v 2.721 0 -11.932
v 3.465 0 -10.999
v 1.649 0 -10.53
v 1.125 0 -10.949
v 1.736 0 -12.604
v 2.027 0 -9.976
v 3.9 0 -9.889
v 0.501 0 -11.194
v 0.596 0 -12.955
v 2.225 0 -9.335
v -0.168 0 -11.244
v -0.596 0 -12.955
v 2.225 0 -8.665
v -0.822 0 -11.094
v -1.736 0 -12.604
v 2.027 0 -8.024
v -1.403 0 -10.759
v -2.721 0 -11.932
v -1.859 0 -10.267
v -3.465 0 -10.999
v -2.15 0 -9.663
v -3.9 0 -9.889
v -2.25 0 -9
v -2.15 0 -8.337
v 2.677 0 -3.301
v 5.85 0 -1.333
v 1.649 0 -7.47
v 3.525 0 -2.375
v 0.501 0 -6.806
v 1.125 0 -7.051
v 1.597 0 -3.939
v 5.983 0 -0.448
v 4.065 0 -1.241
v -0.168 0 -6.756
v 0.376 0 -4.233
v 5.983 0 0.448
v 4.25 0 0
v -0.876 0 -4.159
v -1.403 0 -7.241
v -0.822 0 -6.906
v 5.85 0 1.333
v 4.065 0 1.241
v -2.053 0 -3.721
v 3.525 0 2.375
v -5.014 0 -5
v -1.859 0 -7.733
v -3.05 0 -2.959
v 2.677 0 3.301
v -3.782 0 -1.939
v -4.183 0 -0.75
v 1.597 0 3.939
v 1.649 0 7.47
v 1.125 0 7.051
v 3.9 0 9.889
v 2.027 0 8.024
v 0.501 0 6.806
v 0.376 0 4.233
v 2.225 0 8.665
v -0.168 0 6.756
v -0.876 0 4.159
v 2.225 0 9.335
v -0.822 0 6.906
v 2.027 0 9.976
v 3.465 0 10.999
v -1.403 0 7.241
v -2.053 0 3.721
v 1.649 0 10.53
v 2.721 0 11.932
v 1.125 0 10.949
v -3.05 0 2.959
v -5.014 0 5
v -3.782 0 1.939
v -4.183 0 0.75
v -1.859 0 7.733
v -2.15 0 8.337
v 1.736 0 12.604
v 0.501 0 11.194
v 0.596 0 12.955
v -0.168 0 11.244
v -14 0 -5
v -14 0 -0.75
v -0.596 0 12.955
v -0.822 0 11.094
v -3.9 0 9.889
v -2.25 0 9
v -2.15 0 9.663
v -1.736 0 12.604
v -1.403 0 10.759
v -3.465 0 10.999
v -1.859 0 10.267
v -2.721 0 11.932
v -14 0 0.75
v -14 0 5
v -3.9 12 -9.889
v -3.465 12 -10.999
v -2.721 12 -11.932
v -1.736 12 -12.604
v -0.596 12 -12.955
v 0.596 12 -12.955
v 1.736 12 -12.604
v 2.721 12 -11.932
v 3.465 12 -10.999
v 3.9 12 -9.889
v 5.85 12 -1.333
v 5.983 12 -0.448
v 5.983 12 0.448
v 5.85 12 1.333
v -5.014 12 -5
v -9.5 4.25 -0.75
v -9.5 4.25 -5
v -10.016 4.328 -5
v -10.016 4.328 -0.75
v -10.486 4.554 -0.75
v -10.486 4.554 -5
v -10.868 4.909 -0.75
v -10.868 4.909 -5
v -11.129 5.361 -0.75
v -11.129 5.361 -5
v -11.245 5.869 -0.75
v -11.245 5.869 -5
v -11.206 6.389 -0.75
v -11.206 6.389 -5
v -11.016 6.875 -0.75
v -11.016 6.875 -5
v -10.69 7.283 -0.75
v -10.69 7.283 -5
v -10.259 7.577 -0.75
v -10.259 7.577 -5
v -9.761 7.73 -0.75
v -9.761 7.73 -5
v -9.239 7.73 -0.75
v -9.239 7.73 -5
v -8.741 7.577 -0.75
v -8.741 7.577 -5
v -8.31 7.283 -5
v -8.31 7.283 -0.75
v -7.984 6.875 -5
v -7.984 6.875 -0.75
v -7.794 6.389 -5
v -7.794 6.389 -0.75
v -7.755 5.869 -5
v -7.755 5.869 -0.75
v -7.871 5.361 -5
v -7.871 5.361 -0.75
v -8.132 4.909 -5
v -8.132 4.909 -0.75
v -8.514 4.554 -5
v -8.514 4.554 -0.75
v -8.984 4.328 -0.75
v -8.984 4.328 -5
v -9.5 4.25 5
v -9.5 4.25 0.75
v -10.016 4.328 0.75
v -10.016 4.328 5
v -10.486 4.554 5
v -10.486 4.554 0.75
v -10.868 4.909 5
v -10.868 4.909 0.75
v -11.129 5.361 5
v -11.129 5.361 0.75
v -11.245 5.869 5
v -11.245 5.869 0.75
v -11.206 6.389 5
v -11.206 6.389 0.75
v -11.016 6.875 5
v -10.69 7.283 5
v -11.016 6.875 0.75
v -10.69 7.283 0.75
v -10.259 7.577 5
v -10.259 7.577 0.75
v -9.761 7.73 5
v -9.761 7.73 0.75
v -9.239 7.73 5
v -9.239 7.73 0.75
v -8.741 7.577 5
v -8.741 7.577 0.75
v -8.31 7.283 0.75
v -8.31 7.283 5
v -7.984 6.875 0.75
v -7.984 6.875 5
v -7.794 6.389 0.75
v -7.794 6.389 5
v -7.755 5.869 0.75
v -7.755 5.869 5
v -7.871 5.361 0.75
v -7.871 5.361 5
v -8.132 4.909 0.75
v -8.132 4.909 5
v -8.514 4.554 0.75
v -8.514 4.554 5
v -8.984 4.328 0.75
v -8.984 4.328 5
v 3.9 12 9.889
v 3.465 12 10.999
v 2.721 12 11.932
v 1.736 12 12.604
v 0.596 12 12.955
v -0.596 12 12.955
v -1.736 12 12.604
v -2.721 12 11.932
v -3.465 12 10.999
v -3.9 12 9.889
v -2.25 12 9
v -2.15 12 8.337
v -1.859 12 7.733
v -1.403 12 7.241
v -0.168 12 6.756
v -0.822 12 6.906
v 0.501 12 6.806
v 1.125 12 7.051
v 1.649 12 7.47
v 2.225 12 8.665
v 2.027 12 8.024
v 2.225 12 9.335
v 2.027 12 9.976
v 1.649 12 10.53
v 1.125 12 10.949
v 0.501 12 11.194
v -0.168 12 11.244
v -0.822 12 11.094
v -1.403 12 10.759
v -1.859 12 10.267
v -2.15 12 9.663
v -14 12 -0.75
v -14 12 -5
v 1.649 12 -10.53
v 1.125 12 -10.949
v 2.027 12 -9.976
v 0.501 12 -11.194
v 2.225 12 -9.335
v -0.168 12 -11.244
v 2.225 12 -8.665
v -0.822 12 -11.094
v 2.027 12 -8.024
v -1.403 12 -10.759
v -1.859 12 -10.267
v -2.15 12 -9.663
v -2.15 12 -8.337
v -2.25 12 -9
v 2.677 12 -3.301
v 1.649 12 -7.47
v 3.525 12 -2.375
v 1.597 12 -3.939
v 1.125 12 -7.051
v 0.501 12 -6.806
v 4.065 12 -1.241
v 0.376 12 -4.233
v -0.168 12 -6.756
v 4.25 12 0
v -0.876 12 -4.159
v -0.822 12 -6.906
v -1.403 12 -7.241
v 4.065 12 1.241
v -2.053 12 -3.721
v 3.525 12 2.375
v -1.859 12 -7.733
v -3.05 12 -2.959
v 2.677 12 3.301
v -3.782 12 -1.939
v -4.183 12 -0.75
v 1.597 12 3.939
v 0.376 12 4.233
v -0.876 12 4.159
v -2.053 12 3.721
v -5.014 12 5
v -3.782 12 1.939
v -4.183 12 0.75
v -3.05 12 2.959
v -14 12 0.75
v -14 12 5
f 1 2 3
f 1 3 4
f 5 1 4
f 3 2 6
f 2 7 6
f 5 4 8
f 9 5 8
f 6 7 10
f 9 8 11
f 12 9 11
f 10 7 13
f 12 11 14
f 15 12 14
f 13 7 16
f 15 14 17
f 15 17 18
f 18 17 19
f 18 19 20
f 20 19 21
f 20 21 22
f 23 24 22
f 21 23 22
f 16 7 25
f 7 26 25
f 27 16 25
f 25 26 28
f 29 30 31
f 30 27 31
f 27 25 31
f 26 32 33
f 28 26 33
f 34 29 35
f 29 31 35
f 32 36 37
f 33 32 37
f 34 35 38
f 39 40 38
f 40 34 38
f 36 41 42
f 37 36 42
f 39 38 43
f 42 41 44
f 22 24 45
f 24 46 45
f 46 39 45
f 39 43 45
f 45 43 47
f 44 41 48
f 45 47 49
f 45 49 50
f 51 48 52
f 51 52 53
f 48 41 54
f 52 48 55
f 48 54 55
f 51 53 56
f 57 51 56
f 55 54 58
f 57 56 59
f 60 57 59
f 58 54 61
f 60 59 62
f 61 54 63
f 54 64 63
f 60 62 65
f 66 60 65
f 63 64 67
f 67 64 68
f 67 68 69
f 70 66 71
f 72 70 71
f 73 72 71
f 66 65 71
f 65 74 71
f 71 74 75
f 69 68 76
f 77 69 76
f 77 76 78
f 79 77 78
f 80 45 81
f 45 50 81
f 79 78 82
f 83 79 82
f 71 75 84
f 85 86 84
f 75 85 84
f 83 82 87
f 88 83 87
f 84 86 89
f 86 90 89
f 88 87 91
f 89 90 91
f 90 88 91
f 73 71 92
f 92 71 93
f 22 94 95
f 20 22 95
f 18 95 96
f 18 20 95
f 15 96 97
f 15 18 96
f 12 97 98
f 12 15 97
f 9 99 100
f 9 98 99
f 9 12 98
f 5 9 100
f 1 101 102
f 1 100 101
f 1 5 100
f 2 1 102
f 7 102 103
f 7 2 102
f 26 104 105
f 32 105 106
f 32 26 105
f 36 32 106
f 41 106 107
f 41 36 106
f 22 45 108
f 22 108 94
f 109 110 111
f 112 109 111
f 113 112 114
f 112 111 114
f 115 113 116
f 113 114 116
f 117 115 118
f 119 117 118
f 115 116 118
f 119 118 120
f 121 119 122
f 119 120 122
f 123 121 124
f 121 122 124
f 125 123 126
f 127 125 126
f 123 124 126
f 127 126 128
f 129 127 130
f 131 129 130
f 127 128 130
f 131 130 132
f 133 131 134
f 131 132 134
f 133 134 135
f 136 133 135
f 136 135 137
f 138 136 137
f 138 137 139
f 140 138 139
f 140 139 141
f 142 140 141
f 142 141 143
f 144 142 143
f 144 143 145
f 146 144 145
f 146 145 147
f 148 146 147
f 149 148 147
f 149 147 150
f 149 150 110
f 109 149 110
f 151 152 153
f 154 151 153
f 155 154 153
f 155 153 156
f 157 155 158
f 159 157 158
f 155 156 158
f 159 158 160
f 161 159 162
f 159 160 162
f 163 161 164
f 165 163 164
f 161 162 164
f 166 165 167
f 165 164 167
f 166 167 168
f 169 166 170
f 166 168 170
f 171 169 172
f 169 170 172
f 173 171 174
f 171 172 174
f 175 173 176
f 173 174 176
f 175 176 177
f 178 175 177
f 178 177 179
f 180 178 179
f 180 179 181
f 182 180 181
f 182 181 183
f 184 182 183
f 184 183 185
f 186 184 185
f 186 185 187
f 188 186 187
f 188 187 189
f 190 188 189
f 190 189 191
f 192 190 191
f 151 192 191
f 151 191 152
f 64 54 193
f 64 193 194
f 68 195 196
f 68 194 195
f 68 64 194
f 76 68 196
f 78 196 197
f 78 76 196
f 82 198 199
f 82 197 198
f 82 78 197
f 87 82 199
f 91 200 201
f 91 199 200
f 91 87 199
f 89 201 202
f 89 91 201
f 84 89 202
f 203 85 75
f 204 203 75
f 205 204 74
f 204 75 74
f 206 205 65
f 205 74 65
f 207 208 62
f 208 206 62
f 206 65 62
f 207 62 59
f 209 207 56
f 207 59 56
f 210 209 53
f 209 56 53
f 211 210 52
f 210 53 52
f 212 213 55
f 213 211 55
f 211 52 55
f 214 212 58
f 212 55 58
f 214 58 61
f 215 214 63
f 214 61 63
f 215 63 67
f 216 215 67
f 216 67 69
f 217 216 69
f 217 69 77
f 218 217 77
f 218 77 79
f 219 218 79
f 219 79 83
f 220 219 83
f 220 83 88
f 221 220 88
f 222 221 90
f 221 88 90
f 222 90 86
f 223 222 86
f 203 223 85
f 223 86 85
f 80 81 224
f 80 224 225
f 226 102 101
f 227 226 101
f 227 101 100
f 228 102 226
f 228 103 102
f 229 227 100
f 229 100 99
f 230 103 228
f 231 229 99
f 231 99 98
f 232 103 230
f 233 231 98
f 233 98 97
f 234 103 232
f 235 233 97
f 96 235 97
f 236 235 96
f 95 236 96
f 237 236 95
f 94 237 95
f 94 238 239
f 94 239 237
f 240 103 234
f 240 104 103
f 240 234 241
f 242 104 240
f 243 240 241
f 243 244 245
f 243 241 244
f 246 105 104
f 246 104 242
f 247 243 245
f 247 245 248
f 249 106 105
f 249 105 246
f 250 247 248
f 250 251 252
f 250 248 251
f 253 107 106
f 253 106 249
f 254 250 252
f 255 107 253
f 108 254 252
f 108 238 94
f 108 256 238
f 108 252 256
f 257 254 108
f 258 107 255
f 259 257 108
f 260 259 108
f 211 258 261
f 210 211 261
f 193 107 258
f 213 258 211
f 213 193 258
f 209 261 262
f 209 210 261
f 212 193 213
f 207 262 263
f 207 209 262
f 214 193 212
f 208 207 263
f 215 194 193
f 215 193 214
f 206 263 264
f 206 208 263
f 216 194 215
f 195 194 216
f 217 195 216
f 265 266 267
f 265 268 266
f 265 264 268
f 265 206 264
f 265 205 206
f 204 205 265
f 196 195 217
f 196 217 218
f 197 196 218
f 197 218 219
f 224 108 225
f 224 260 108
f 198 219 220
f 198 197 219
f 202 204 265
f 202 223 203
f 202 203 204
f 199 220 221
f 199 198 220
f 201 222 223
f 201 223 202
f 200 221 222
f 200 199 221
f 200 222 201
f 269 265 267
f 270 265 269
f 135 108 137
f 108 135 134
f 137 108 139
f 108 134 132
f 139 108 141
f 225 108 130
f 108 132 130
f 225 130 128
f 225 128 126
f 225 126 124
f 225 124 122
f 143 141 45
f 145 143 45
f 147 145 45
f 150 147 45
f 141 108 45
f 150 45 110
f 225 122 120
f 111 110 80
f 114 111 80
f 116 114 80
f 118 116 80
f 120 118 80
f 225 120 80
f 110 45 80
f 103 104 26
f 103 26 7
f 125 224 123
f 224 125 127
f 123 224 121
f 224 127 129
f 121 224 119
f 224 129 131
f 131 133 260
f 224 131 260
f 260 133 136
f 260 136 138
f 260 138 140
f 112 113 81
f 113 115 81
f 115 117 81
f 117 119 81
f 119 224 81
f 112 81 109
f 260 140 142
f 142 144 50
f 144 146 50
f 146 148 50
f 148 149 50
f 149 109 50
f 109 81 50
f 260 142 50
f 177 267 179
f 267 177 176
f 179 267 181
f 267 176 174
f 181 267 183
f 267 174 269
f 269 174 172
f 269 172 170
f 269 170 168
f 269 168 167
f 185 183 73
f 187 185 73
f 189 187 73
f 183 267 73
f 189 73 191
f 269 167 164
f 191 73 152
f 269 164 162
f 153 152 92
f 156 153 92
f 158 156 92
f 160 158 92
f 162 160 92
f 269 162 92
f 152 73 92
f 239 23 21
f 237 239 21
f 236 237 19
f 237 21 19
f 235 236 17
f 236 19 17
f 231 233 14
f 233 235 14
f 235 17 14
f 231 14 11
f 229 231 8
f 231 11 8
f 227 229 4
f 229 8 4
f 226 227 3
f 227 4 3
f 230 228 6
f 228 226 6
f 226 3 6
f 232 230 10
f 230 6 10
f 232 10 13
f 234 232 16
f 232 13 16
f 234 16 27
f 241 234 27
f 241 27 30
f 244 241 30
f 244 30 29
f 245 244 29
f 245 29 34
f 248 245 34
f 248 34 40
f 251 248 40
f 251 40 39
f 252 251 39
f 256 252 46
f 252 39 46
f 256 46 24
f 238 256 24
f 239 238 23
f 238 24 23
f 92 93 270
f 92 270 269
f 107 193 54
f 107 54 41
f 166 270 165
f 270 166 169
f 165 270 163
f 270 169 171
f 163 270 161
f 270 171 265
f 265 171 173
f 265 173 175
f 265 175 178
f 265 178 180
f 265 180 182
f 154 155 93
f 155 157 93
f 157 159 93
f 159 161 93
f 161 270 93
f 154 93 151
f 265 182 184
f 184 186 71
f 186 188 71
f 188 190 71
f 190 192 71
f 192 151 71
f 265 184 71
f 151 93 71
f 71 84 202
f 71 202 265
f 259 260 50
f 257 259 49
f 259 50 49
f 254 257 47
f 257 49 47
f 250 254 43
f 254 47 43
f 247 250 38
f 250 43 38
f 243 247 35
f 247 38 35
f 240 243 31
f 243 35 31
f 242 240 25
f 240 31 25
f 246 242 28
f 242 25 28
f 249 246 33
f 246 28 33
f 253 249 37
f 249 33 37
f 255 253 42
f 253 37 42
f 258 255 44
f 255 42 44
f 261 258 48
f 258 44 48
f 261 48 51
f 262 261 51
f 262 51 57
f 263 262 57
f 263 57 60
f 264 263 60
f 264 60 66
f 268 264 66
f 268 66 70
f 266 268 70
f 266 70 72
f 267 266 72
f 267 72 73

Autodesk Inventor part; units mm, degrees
ref_plane "YZ Plane" through (0, 0, 0) normal (1, 0, 0) x (0, 1, 0)
ref_plane "XZ Plane" through (0, 0, 0) normal (0, 1, 0) x (-1, 0, 0)
ref_plane "XY Plane" through (0, 0, 0) normal (0, 0, 1) x (1, 0, 0)
sketch "Sketch1" plane through (0, 0, 0) normal (0, 1, 0) x (-1, 0, 0)
  circle A0 centre (0, 0) radius 4.25
  circle A1 centre (0, 0) radius 6
  line L0 (14, 5) -> (14, -5)
  line L1 (4.1833, 0.75) -> (14, 0.75)
  line L2 (14, 0.75) -> (14, -0.75)
  line L3 (14, -0.75) -> (4.1833, -0.75)
  circle A2 centre (0, 9) radius 2.25
  circle A3 centre (0, -9) radius 2.25
  circle A4 centre (0, 9) radius 4
  circle A5 centre (0, -9) radius 4
  line L4 (3.9, 9.8889) -> (5.85, 1.3333)
  line L5 (-3.9, 9.8889) -> (-5.85, 1.3333)
  line L6 (5.85, -1.3333) -> (3.9, -9.8889)
  line L7 (-5.85, -1.3333) -> (-3.9, -9.8889)
  line L8 (3.3166, -5) -> (14, -5)
  line L9 (14, 5) -> (3.3166, 5)
  line L10 (18, 0) -> (-10, 0) projected
  point P0 (14, 0)
  point P1 (14, -0.75)
  point P2 (14, 0.75)
  point P3 (5.0143, -5)
  point P4 (5.0143, 5)
  point P5 (5.9529, -0.75)
  point P6 (6, 0)
  point P7 (14, 0)
  dimension "d0" = 8.5
  dimension "d1" = 12
  dimension "d2" = 10
  dimension "d3" = 14
  dimension "d4" = 1.5
  dimension "d5" = 14
  dimension "d6" = 4.5
  dimension "d7" = 4.5
  dimension "d8" = 18
  dimension "d9" = 9
  dimension "d10" = 8
  dimension "d11" = 8
  dimension "d30" = 5
extrude "Extrusion1" add sketch "Sketch1" along normal blind 12 contours A0 L10 A1 A4 L1 | L3 A1 A5 L10 A0 | A1 L4 L9 L0 L1 | L3 L0 L8 L6 A1 | A1 L9 L4 | L6 L8 A1 | L5 A4 A1 | A1 A5 L7 | A1 A4 L4 L9 | L8 L6 A5 A1 | A4 A1 | A1 A4 | A5 A1 | A1 A5
sketch "Sketch4" plane through (-14, 0, 5) normal (0, 0, 1) x (1, 0, 0)
  line L0 (0, 0) -> (8.9857, 0) projected
  line L1 (0, 12) -> (8.9857, 12) projected
  point P0 (14, 0)
  point P1 (4.5, 6)
  dimension "d31" = 6
  dimension "d32" = 6
  dimension "d33" = 4.5
hole "Hole1" at (-9.5, 6, 5) direction (0, 0, -1) diameter 3.5 depth 10
equation "\"d12\" = d1"
properties part number "Kep_Truc"
